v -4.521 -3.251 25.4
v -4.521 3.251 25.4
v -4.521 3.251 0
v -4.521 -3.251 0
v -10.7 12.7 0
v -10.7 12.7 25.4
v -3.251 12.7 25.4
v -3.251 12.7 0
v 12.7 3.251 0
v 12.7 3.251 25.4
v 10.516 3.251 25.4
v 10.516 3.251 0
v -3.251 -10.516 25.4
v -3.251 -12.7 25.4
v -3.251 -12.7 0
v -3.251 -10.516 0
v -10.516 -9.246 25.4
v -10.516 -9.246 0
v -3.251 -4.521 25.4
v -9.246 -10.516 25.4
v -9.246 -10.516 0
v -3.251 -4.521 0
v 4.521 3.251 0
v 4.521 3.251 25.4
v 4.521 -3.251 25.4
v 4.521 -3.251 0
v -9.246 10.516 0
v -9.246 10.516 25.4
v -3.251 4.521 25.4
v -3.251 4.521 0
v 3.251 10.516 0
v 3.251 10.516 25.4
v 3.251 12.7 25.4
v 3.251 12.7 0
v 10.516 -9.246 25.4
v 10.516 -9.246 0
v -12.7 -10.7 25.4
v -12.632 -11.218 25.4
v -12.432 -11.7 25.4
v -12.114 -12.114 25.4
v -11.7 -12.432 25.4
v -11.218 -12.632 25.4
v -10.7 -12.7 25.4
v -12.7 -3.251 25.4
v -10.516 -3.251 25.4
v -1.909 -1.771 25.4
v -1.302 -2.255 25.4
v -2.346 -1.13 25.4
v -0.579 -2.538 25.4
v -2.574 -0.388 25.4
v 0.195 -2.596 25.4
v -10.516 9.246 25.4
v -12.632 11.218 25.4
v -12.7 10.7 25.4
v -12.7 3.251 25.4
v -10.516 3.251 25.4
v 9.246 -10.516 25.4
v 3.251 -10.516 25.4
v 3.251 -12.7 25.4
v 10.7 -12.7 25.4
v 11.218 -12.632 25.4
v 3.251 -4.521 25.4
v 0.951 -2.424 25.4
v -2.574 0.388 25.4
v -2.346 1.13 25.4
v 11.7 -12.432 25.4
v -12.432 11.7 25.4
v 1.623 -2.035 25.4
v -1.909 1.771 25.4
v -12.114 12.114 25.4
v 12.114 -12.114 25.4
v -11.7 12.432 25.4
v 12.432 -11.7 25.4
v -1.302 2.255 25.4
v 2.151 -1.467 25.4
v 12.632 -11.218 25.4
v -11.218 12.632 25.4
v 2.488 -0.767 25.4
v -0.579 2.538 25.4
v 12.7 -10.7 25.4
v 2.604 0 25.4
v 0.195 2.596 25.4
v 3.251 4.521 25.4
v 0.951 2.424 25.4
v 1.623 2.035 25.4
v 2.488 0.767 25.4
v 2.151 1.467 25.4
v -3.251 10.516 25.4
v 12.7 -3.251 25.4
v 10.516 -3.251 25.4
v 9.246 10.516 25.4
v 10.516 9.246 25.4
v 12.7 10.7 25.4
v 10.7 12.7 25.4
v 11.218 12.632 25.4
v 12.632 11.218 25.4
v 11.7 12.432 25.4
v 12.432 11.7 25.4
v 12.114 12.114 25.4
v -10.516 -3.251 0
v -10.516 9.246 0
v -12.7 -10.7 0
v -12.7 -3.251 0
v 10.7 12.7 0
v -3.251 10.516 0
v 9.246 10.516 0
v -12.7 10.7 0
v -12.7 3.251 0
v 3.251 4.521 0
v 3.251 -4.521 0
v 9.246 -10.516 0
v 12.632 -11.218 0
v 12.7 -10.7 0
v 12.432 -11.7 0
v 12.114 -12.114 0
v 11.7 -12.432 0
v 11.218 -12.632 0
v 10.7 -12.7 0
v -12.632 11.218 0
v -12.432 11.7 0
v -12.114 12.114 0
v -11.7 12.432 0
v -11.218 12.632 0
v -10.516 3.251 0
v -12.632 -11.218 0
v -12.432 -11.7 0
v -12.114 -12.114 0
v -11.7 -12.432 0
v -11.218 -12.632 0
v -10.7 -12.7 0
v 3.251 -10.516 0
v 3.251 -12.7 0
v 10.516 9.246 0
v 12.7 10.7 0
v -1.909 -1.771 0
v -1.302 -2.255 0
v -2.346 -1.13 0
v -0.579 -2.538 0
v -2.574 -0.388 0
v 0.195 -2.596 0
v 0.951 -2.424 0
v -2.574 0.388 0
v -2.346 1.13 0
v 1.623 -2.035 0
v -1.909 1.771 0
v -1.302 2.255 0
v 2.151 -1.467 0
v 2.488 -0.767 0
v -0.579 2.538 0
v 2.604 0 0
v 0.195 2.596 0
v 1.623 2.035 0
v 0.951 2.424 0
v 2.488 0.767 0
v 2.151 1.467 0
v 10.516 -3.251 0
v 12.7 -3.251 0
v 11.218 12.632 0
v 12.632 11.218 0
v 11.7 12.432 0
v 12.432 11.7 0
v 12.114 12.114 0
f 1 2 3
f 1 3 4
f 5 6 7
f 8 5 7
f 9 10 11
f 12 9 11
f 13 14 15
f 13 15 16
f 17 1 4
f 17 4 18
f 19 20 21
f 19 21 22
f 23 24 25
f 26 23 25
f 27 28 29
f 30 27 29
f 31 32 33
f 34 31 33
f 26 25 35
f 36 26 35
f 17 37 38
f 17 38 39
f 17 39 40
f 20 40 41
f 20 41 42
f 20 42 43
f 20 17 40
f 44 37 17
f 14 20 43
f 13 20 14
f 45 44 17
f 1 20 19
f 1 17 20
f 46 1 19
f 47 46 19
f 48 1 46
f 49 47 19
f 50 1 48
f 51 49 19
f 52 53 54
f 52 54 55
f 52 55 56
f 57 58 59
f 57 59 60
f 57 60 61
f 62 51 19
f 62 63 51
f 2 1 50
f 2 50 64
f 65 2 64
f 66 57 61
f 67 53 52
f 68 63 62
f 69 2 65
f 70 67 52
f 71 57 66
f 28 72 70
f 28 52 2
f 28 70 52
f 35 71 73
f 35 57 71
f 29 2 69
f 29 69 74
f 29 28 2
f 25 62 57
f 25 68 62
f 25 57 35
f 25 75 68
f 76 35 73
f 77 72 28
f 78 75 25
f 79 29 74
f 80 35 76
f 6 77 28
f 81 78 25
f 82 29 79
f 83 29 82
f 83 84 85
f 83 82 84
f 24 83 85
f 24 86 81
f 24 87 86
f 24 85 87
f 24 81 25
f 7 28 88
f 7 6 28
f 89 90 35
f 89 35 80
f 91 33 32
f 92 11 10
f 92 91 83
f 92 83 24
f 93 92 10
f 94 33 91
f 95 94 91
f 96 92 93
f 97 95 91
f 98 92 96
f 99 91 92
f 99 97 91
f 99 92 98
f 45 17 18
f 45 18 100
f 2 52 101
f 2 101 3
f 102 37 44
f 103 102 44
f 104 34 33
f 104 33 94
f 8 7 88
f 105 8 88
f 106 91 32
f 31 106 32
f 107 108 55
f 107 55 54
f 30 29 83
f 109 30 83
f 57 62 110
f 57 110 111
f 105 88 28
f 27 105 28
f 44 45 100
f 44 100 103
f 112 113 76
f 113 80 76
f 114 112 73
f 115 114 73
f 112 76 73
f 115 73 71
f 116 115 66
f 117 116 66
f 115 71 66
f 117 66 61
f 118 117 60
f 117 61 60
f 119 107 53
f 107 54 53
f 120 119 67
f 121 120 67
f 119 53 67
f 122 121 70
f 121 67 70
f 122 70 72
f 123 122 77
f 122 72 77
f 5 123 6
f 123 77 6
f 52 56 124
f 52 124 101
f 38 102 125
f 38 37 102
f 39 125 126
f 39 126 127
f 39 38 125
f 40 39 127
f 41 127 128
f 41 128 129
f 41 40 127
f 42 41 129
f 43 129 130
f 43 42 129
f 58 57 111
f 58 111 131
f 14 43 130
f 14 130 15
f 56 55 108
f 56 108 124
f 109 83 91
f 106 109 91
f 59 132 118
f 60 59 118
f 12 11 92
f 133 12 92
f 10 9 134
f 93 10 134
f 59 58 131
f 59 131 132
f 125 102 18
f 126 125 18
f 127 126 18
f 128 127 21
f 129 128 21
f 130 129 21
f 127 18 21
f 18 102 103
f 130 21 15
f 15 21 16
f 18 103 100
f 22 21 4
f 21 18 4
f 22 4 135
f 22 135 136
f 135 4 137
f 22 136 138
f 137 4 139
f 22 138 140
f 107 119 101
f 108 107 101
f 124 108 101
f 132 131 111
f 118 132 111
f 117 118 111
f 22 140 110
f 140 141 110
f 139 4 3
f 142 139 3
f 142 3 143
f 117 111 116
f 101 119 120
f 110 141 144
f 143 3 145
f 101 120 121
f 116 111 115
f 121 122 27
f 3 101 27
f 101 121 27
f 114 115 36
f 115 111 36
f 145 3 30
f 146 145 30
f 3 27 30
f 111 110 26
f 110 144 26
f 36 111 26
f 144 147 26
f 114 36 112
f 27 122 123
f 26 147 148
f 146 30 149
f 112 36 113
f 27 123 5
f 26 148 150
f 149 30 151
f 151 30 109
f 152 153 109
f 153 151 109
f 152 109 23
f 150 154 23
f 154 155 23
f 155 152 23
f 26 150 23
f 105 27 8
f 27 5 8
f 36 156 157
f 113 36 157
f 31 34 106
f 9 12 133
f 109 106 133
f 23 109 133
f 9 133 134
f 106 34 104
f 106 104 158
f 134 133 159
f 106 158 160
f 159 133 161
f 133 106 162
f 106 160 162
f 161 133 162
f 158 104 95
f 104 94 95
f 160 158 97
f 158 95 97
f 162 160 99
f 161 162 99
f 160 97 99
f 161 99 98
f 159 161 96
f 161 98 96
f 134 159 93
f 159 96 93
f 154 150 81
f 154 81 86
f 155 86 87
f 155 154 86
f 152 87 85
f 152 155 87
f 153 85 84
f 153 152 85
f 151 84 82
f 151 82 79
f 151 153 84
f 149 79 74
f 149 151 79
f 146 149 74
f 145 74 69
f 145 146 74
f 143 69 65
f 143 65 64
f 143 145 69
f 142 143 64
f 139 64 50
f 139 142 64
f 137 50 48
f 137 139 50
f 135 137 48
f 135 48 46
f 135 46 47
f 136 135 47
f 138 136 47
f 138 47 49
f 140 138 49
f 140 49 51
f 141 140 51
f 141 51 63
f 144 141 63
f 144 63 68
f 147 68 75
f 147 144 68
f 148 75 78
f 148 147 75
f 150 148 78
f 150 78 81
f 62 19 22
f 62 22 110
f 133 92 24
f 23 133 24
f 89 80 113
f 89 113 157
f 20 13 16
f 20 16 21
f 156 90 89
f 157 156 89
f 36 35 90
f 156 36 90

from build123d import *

# Parameters (mm, degrees)
SKETCH_W     = 25.4
SKETCH_H     = 25.4
SKETCH_R     = 2.6035
PAD_DEPTH    = 25.4
POCKET_DEPTH = 25.401
FILLET002_R  = 2


with BuildPart() as part:
    # Sketch → Pad (new body)
    with BuildSketch(Plane.XY):
        Rectangle(SKETCH_W, SKETCH_H)
        Circle(SKETCH_R, mode=Mode.SUBTRACT)
    extrude(amount=PAD_DEPTH)

    # Sketch001 (on Face7 of Pad) → Pocket (cut, through all)
    with BuildSketch(Plane.XY.offset(25.4)):
        Polygon((-3.2512, 4.5212), (3.2512, 4.5212), (9.2456, 10.5156), (3.2512, 10.5156), (3.2512, 12.7), (-3.2512, 12.7), (-3.2512, 10.5156), (-9.2456, 10.5156), align=None)
        Polygon((4.5212, 3.2512), (4.5212, -3.2512), (10.5156, -9.2456), (10.5156, -3.2512), (12.7, -3.2512), (12.7, 3.2512), (10.5156, 3.2512), (10.5156, 9.2456), align=None)
        Polygon((-3.2512, -4.5212), (3.2512, -4.5212), (9.2456, -10.5156), (3.2512, -10.5156), (3.2512, -12.7), (-3.2512, -12.7), (-3.2512, -10.5156), (-9.2456, -10.5156), align=None)
        Polygon((-4.5212, 3.2512), (-4.5212, -3.2512), (-10.5156, -9.2456), (-10.5156, -3.2512), (-12.7, -3.2512), (-12.7, 3.2512), (-10.5156, 3.2512), (-10.5156, 9.2456), align=None)
    extrude(amount=-POCKET_DEPTH, mode=Mode.SUBTRACT)

    # Fillet002
    fillet002_edges = [part.edges().sort_by_distance(p)[0] for p in [
        (12.7, -12.7, 12.7),
        (12.7, 12.7, 12.7),
        (-12.7, 12.7, 12.7),
        (-12.7, -12.7, 12.7),
    ]]
    fillet(fillet002_edges, radius=FILLET002_R)


solid = part.part
